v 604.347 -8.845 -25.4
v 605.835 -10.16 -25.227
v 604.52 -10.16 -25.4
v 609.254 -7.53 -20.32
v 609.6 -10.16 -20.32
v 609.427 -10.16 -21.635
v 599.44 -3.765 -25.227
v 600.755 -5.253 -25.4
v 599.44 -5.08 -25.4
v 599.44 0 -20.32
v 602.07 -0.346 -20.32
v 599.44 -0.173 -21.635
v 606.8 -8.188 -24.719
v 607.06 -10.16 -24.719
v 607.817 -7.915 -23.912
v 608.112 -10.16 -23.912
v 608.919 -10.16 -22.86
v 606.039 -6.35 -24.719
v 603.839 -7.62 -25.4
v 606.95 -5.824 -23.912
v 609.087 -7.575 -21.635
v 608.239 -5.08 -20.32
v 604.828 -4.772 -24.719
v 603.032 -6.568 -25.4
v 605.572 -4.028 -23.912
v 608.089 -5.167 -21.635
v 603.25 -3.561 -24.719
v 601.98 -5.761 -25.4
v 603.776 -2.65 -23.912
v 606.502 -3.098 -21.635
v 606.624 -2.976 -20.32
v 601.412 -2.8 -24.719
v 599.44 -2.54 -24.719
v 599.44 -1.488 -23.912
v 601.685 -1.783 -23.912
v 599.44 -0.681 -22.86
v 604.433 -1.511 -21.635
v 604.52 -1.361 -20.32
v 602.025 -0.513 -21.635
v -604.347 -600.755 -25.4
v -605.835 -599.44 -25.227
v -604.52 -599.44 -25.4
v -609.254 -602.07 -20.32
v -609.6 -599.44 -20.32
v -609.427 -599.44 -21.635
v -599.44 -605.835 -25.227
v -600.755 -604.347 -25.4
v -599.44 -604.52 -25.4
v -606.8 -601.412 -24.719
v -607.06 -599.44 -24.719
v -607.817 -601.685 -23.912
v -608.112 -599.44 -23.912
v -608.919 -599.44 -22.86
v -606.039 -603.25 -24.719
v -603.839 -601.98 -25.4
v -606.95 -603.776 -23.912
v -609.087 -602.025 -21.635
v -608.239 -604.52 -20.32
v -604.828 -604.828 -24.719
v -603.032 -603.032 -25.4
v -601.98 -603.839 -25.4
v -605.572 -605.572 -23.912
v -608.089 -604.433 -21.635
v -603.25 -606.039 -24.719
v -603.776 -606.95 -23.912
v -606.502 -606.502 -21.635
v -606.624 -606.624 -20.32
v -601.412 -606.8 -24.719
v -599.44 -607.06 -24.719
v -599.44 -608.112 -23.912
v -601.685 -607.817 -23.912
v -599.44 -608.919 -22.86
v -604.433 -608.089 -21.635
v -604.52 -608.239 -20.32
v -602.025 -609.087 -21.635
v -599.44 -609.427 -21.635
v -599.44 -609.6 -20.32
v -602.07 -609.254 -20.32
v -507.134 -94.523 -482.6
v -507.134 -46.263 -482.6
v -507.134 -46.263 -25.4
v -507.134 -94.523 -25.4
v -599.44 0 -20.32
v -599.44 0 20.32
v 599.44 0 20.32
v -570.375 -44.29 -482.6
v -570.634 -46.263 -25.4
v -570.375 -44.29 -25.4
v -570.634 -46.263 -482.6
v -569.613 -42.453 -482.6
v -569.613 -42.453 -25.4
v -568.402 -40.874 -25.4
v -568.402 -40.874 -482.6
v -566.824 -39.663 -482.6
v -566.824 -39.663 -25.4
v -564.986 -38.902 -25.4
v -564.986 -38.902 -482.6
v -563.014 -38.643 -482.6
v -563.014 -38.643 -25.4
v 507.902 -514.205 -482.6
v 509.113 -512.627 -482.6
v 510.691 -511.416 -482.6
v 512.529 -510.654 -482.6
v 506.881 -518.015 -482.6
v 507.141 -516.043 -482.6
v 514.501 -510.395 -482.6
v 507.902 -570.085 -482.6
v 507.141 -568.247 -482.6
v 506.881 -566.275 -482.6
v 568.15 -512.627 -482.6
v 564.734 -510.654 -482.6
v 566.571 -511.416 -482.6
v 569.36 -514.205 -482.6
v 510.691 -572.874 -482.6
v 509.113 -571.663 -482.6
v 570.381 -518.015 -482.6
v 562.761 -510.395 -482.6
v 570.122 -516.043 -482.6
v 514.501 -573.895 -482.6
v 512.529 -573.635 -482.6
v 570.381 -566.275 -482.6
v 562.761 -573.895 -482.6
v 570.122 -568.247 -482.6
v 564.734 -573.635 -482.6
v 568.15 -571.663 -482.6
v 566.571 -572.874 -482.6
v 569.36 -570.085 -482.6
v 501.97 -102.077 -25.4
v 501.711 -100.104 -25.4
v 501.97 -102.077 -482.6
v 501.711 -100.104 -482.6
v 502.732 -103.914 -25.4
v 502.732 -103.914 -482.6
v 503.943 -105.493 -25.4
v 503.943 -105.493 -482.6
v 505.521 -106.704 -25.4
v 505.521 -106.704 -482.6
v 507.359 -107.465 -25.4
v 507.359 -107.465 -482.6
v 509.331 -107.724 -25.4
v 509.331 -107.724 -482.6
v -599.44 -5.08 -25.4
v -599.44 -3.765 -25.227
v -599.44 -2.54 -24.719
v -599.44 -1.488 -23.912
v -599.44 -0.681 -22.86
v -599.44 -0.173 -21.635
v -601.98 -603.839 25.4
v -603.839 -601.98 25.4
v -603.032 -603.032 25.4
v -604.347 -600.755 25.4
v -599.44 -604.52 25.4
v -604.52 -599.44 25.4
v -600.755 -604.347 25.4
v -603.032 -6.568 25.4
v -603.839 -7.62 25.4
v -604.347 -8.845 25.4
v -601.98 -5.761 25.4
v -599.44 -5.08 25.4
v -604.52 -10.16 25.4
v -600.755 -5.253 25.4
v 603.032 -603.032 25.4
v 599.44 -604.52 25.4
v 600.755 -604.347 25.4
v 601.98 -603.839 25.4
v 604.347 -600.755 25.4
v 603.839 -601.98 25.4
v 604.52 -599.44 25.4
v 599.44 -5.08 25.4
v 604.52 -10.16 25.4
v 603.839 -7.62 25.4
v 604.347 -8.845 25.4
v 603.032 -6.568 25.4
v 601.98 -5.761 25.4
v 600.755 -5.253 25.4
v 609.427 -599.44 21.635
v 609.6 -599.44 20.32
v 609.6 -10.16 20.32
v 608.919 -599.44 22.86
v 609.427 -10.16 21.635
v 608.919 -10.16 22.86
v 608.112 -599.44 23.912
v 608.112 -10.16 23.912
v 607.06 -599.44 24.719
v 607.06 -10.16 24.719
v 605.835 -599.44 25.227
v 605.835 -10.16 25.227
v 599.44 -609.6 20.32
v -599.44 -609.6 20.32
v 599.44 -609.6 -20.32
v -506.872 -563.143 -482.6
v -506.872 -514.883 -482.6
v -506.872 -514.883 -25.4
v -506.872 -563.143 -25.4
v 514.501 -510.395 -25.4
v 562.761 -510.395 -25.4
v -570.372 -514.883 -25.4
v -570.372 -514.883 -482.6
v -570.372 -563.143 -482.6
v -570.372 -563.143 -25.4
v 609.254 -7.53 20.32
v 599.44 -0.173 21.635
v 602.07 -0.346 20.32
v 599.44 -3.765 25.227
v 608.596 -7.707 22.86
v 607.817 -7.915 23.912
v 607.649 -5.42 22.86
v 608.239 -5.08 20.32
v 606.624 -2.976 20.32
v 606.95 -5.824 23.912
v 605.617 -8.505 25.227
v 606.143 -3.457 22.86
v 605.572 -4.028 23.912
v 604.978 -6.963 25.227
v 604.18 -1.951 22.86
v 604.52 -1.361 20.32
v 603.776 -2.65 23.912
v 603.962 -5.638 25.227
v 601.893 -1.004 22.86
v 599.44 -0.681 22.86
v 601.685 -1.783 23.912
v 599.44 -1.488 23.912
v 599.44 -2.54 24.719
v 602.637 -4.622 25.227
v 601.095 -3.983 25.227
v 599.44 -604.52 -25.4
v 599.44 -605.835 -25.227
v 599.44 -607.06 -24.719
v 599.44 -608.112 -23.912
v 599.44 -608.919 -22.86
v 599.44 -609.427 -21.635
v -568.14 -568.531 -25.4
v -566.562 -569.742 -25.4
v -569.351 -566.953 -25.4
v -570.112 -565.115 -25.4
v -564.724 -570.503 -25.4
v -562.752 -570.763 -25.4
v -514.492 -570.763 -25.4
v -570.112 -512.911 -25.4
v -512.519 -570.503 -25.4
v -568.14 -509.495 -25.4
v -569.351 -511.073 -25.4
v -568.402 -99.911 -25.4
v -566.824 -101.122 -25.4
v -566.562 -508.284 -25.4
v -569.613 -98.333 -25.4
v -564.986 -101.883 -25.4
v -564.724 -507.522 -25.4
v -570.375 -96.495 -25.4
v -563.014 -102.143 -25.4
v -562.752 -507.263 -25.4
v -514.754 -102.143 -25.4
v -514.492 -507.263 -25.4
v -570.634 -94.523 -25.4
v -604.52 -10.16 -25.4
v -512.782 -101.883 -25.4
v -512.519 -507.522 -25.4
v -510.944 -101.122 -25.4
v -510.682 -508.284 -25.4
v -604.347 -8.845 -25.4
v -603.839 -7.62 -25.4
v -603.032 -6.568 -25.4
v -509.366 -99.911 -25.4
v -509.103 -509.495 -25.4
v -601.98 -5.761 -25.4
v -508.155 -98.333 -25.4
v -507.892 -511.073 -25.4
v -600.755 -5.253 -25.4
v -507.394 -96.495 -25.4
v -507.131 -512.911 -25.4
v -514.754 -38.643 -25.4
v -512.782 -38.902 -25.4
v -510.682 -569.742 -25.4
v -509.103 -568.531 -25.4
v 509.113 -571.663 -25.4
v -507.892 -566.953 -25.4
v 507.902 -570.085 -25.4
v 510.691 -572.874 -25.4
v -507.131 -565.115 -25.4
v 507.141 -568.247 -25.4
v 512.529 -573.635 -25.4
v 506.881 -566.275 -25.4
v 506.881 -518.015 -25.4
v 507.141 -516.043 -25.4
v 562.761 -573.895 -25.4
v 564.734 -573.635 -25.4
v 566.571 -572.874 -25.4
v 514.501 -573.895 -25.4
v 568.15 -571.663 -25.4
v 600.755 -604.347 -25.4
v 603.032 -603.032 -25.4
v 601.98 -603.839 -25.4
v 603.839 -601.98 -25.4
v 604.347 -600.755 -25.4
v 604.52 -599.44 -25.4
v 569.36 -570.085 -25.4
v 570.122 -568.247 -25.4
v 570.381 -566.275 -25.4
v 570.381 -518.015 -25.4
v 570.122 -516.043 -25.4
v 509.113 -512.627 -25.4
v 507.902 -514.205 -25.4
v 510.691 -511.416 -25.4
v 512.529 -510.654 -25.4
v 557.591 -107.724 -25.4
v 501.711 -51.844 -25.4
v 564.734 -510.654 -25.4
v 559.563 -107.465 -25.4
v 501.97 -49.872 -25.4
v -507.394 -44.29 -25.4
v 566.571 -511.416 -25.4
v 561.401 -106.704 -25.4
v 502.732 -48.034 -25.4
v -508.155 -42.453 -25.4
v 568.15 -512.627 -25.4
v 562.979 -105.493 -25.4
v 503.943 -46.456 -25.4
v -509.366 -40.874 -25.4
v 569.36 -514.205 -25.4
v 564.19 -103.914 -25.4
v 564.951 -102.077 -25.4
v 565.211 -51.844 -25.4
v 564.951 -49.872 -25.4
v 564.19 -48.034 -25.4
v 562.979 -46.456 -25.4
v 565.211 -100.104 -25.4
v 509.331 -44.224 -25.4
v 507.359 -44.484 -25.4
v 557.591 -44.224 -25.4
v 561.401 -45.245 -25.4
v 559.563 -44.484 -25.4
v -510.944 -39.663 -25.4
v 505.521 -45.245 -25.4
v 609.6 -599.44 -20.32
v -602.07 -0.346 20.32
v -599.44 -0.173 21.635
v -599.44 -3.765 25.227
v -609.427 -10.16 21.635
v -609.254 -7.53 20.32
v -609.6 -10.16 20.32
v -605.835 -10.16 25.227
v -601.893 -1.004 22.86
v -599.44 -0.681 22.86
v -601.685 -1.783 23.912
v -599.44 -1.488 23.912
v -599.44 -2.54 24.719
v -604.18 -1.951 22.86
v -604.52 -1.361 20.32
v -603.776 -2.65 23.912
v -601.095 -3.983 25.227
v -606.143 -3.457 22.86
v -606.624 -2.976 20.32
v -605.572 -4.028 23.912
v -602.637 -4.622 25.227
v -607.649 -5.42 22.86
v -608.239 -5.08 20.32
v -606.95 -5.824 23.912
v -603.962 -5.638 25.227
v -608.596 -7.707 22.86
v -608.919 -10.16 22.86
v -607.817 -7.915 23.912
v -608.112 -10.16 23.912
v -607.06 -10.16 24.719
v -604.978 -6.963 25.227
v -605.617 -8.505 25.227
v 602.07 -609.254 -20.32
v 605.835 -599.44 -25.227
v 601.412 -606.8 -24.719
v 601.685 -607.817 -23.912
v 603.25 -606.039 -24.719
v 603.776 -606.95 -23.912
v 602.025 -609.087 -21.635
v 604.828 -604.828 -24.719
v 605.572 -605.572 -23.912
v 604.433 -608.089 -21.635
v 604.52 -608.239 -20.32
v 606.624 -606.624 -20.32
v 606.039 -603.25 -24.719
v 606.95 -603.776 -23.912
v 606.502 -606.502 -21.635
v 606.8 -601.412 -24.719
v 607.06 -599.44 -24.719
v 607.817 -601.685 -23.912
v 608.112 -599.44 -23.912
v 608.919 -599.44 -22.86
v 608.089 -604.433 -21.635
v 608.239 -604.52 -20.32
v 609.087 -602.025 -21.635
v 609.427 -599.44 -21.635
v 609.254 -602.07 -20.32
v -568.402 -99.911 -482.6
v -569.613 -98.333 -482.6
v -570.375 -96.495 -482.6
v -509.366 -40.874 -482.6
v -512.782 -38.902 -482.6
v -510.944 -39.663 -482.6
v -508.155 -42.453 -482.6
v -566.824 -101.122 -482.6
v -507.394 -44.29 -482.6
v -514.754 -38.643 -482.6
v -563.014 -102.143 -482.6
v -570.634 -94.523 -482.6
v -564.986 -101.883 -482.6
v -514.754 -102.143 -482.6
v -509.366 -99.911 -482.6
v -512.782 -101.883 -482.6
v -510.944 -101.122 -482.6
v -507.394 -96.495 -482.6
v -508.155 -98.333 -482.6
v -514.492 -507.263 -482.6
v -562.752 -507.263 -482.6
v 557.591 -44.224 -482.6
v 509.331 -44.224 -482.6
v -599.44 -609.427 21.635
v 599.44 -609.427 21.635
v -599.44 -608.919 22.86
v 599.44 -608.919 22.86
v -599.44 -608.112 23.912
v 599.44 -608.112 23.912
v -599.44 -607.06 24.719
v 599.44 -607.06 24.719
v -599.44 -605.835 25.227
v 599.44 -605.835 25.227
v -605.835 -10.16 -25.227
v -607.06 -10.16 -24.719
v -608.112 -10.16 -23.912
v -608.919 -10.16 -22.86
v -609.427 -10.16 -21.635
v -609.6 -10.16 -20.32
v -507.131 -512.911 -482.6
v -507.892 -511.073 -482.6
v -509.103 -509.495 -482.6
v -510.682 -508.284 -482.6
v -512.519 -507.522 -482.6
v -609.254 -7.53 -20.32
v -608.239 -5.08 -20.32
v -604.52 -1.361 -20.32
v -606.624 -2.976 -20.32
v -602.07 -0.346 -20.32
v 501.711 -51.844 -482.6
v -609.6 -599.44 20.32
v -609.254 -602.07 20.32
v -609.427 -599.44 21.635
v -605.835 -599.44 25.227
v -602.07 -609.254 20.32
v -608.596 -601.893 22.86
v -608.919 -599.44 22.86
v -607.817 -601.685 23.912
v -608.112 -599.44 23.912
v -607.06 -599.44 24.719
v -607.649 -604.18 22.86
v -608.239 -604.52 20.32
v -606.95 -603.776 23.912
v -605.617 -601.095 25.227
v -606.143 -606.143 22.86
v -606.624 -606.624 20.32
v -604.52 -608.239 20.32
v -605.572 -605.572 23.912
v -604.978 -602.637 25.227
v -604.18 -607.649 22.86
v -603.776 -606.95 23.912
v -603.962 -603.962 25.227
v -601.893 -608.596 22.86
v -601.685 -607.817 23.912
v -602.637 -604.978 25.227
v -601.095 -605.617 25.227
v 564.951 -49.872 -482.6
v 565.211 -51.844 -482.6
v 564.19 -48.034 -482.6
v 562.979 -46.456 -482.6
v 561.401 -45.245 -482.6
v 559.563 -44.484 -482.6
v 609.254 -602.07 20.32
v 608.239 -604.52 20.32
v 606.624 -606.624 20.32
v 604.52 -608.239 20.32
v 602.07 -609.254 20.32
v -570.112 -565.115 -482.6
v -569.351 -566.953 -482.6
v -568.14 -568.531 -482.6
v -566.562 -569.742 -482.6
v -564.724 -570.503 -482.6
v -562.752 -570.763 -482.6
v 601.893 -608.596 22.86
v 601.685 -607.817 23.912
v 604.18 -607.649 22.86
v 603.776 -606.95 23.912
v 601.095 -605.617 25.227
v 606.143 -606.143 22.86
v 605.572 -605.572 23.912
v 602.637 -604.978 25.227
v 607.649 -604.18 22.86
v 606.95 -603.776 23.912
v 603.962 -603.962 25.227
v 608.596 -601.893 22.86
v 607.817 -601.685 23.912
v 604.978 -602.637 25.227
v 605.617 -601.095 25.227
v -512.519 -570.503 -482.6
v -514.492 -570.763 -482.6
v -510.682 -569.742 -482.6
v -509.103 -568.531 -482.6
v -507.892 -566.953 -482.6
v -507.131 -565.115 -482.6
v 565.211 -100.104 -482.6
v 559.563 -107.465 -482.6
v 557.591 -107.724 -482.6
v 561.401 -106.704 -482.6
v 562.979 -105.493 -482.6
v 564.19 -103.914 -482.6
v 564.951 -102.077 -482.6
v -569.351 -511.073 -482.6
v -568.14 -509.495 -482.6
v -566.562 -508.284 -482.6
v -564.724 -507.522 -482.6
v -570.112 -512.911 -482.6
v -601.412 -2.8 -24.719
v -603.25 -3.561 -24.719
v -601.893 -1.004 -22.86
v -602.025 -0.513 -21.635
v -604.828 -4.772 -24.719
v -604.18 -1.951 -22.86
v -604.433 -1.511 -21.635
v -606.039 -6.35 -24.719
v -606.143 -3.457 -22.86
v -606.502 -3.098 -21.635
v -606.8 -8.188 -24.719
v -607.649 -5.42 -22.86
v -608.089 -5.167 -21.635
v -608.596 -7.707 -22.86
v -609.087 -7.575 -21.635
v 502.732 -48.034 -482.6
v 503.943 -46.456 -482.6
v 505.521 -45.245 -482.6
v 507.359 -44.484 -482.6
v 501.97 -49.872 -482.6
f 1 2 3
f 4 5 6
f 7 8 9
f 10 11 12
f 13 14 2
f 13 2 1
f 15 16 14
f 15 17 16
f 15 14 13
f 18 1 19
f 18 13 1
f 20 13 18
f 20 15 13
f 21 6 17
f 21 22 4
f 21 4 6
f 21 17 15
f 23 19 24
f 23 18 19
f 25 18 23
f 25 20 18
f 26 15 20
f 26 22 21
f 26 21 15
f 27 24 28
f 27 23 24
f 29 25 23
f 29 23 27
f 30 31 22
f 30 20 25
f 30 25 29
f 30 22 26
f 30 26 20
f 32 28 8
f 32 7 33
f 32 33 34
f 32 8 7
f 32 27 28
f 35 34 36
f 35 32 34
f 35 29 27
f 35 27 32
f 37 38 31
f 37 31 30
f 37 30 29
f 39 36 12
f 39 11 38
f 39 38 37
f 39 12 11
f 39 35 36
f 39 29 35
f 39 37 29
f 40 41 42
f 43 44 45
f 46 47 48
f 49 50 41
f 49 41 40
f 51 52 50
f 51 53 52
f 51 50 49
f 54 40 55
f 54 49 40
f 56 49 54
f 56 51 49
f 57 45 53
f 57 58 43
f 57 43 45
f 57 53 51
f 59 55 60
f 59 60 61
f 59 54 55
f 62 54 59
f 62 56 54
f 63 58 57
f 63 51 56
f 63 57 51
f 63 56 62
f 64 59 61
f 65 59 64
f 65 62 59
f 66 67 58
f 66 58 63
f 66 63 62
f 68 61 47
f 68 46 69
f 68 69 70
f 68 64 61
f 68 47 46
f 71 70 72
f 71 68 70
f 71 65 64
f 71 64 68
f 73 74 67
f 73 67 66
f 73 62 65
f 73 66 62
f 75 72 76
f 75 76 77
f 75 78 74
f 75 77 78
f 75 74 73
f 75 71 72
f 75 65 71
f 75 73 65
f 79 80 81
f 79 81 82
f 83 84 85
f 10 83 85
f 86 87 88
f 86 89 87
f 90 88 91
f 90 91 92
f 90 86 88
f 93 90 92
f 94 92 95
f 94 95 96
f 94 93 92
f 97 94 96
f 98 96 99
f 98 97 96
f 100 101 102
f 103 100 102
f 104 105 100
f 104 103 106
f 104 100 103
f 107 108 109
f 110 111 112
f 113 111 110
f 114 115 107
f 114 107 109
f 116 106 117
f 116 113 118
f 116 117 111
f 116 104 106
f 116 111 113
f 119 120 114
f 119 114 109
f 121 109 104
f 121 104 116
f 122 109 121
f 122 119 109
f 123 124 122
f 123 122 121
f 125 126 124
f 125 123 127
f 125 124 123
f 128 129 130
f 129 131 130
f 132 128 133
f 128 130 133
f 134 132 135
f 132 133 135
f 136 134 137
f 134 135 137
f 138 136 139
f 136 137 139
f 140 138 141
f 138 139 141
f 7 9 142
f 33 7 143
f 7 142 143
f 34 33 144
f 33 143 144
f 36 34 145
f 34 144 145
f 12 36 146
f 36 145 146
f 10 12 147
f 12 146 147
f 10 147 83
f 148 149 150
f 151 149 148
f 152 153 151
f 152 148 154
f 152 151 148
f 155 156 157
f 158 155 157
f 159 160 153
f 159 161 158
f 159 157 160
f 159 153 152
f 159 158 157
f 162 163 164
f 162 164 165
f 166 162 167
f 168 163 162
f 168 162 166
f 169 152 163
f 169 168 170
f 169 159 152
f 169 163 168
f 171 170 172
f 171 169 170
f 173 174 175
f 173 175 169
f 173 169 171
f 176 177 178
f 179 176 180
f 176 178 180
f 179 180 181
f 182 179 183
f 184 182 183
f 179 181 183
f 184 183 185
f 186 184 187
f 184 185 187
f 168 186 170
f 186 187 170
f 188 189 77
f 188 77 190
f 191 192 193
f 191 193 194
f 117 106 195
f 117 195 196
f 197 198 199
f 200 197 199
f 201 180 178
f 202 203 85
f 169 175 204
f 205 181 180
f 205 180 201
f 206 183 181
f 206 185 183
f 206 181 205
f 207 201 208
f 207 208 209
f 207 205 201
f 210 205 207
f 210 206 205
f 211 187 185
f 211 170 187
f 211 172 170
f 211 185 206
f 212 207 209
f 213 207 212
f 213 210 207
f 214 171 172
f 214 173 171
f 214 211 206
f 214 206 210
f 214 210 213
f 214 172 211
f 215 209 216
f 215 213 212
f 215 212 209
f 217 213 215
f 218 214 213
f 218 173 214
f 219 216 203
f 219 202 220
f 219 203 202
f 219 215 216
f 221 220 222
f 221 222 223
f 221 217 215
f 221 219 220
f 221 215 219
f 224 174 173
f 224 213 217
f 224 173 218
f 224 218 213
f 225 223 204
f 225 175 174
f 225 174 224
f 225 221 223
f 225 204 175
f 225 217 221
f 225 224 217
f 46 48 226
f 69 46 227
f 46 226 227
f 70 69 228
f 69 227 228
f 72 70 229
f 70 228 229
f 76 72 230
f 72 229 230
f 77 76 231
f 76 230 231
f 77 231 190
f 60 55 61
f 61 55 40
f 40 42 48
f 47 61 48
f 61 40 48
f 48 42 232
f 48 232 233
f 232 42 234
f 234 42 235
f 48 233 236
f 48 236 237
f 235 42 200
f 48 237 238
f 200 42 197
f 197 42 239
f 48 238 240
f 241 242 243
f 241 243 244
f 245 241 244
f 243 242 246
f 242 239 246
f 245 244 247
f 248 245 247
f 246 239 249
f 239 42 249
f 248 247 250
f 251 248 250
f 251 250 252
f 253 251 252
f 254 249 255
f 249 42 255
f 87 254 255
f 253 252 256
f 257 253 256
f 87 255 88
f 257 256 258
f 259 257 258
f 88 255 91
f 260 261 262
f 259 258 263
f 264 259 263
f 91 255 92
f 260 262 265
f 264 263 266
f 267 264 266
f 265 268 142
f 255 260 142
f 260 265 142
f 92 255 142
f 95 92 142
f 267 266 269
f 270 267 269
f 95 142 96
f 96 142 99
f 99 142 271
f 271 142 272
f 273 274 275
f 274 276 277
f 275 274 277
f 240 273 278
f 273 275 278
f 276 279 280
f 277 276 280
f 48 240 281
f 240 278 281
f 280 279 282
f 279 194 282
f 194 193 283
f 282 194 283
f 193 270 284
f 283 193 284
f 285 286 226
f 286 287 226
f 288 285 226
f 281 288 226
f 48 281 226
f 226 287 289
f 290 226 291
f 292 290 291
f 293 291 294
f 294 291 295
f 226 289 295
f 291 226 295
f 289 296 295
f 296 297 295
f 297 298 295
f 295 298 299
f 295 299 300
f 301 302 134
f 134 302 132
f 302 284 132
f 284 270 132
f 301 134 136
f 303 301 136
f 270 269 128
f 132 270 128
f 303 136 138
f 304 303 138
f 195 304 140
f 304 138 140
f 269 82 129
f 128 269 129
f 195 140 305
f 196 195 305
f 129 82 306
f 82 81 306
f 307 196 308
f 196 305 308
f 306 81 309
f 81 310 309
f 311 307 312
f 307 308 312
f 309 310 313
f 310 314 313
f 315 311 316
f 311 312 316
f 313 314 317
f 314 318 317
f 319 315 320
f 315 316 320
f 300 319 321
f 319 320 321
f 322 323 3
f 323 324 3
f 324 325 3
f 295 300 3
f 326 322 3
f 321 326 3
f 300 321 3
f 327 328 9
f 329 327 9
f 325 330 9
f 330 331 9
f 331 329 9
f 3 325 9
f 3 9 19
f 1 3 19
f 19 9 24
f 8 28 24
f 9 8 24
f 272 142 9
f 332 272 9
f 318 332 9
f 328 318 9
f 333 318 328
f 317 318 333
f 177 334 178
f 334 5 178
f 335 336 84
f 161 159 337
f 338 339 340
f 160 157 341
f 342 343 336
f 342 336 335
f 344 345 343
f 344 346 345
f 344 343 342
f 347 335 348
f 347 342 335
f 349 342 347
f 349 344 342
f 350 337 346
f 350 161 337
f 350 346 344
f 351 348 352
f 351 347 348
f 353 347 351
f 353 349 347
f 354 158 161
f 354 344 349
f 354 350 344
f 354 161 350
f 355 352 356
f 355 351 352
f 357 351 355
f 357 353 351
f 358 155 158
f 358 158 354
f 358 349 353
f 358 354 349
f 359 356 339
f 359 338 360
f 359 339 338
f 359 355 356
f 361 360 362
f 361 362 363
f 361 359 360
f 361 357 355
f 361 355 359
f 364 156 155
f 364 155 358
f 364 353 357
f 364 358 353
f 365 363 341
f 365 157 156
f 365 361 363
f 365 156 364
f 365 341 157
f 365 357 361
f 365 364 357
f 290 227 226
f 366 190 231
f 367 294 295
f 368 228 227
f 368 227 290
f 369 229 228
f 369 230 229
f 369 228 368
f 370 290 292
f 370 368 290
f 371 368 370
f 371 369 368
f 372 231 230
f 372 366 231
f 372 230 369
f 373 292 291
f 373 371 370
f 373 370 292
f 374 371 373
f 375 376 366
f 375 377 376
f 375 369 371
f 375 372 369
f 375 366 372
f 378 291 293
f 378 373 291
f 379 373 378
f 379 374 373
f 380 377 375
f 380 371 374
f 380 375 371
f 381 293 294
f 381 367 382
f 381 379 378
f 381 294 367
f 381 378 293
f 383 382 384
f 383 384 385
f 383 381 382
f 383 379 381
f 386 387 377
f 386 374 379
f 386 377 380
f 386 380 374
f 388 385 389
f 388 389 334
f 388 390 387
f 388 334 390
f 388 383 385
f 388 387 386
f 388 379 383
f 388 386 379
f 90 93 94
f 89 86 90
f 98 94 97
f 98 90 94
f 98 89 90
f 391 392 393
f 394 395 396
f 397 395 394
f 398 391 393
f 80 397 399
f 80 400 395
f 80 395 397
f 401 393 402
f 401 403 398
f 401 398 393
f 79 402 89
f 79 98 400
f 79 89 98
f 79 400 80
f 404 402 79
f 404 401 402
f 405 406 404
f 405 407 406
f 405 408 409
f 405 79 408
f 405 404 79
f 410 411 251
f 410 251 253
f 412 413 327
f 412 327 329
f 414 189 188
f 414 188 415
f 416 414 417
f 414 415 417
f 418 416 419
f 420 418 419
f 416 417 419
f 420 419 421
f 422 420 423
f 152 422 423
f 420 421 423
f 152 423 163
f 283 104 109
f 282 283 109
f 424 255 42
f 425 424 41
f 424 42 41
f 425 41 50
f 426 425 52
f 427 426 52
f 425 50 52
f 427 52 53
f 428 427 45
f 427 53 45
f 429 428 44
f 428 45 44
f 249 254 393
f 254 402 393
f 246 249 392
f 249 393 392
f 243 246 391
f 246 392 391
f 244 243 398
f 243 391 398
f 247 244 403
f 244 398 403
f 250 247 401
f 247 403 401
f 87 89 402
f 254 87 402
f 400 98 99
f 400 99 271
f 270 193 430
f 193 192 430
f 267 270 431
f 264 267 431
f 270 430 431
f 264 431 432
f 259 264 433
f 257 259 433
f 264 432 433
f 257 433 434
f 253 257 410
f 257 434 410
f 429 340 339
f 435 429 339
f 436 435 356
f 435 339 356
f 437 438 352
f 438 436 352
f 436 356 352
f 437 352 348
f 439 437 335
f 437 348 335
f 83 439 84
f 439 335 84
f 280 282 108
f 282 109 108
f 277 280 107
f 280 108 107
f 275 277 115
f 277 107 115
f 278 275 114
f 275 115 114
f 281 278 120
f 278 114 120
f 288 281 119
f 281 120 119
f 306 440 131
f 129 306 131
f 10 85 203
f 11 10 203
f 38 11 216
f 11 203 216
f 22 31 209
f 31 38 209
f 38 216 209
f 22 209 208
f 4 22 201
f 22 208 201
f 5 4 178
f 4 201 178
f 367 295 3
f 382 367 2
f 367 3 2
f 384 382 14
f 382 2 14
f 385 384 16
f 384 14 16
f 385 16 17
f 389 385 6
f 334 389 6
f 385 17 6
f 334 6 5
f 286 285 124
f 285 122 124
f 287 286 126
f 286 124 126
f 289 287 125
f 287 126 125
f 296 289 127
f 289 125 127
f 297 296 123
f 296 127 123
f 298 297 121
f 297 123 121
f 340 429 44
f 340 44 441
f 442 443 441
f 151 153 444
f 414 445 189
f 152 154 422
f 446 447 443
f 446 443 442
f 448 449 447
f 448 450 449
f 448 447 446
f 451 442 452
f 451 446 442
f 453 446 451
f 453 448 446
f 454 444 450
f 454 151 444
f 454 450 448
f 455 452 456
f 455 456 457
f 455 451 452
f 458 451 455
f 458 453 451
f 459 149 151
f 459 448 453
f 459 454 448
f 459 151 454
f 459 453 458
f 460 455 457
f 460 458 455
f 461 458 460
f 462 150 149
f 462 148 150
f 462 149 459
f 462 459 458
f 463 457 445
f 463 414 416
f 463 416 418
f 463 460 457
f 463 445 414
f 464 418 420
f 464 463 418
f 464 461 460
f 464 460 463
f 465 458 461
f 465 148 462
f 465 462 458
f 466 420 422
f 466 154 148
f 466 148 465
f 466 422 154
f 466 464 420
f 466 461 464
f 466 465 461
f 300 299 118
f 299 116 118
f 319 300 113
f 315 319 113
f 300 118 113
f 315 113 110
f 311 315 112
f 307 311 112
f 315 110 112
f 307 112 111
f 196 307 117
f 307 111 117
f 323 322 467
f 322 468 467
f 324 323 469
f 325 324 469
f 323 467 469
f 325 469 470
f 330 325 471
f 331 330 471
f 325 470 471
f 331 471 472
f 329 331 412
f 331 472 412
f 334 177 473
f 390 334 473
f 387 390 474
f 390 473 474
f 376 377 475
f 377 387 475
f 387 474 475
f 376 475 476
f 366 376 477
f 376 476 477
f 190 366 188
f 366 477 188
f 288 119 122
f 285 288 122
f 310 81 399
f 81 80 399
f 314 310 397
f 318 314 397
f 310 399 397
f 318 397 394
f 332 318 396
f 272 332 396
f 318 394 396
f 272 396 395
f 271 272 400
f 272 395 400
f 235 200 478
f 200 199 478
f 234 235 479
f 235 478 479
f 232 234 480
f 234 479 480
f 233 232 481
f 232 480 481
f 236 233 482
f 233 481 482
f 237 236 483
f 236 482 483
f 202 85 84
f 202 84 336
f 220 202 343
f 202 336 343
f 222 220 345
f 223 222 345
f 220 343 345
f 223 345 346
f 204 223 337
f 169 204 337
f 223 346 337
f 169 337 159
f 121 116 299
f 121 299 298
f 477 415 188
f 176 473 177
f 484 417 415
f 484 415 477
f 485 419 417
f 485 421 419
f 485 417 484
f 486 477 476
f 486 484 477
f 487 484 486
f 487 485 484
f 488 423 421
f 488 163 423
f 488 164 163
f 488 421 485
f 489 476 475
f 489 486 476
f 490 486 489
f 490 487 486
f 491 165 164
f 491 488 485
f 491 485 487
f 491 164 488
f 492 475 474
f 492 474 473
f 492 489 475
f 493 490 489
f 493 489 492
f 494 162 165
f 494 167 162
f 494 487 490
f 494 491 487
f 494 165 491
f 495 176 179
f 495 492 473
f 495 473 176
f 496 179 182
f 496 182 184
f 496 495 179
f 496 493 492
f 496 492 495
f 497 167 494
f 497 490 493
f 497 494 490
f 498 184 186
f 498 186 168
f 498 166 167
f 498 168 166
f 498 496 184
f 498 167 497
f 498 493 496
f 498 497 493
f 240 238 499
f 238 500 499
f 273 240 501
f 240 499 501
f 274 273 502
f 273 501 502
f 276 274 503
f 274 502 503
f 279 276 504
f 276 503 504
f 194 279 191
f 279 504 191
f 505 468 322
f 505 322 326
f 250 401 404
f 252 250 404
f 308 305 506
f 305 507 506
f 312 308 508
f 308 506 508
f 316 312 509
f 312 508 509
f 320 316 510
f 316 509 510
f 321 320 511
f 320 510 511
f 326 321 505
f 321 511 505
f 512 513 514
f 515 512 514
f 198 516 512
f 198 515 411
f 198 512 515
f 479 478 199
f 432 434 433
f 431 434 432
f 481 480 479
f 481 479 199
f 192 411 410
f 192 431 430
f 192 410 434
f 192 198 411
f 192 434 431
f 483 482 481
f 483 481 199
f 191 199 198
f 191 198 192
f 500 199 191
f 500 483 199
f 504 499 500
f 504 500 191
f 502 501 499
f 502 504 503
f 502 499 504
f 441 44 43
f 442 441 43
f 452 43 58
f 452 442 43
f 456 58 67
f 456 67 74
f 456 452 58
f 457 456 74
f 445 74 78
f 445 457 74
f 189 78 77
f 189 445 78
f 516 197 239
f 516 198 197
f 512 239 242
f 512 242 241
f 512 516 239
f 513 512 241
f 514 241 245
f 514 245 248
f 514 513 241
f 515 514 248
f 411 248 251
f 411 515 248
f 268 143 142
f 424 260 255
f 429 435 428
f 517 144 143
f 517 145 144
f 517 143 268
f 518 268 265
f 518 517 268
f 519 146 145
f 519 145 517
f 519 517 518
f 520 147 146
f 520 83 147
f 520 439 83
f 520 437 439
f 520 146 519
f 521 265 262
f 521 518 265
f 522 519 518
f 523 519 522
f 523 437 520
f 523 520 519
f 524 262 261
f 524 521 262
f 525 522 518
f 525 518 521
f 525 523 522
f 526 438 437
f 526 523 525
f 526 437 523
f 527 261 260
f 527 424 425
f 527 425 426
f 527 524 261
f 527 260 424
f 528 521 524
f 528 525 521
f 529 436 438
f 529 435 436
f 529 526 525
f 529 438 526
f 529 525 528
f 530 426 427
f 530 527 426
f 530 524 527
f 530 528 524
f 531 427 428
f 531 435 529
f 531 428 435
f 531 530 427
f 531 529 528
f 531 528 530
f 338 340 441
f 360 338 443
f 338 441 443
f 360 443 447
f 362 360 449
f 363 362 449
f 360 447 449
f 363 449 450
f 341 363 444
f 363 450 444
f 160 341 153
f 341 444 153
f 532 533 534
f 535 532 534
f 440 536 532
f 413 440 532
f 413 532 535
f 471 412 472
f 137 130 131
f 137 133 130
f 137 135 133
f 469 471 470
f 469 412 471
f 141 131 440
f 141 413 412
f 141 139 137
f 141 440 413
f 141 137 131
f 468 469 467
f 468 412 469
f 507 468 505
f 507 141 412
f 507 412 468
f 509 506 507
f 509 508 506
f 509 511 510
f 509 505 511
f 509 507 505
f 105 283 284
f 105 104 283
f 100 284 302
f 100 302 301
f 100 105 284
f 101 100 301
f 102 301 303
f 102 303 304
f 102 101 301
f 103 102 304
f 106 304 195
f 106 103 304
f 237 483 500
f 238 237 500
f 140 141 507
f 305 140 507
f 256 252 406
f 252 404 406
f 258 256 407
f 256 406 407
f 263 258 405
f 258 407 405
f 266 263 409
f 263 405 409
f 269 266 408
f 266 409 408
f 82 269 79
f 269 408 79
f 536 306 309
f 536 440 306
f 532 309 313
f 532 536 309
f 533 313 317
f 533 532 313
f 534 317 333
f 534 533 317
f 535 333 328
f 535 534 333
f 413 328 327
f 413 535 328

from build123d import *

# Parameters (mm, degrees)
F0_W      = 1219.2
F0_H      = 50.8
F1_DEPTH  = 609.6
F3_R      = 10.16
F4_R      = 10.16
F5_R      = 10.16
F6_R      = 10.16
F7_R      = 5.08
F8_W      = 63.5
F8_H      = 63.5
F9_DEPTH  = 457.2
F10_R     = 7.62
F11_W     = 63.5
F11_H     = 63.5
F12_DEPTH = 457.2
F13_R     = 7.62
F14_W     = 63.5
F14_H     = 63.5
F15_DEPTH = 457.2
F16_R     = 7.62
F17_W     = 63.5
F17_H     = 63.5
F18_DEPTH = 457.2
F19_R     = 7.62


with BuildPart() as f1:
    # F0 (on Front) → F1 (new body)
    with BuildSketch(Plane.XZ):
        Rectangle(F0_W, F0_H)
    extrude(amount=F1_DEPTH)

    # F3
    f3_edges = [f1.edges().sort_by_distance(p)[0] for p in [
        (-609.6, -609.6, 0),
    ]]
    fillet(f3_edges, radius=F3_R)

    # F4
    f4_edges = [f1.edges().sort_by_distance(p)[0] for p in [
        (-609.6, 0, 0),
    ]]
    fillet(f4_edges, radius=F4_R)

    # F5
    f5_edges = [f1.edges().sort_by_distance(p)[0] for p in [
        (609.6, 0, 0),
    ]]
    fillet(f5_edges, radius=F5_R)

    # F6
    f6_edges = [f1.edges().sort_by_distance(p)[0] for p in [
        (609.6, -609.6, 0),
    ]]
    fillet(f6_edges, radius=F6_R)

    # F7
    f7_edges = [f1.edges().sort_by_distance(p)[0] for p in [
        (-609.6, -304.8, 25.4),
        (-609.6, -304.8, -25.4),
    ]]
    fillet(f7_edges, radius=F7_R)

    # F8 (on face) → F9 (join)
    with BuildSketch(Plane(origin=(0, 0, -25.4), x_dir=(1, 0, 0), z_dir=(0, 0, -1))):
        with Locations((-538.884262, 70.392589)):
            Rectangle(F8_W, F8_H)
    extrude(amount=F9_DEPTH)

    # F10
    f10_edges = [f1.edges().sort_by_distance(p)[0] for p in [
        (-507.134262, -38.642589, -254),
        (-507.134262, -102.142589, -254),
        (-570.634262, -102.142589, -254),
        (-570.634262, -38.642589, -254),
    ]]
    fillet(f10_edges, radius=F10_R)

    # F11 (on face) → F12 (join)
    with BuildSketch(Plane(origin=(0, 0, -25.4), x_dir=(1, 0, 0), z_dir=(0, 0, -1))):
        with Locations((533.460811, 75.974436)):
            Rectangle(F11_W, F11_H)
    extrude(amount=F12_DEPTH)

    # F13
    f13_edges = [f1.edges().sort_by_distance(p)[0] for p in [
        (565.210811, -107.724436, -254),
        (565.210811, -44.224436, -254),
        (501.710811, -107.724436, -254),
        (501.710811, -44.224436, -254),
    ]]
    fillet(f13_edges, radius=F13_R)

    # F14 (on face) → F15 (join)
    with BuildSketch(Plane(origin=(0, 0, -25.4), x_dir=(1, 0, 0), z_dir=(0, 0, -1))):
        with Locations((-538.621542, 539.01282)):
            Rectangle(F14_W, F14_H)
    extrude(amount=F15_DEPTH)

    # F16
    f16_edges = [f1.edges().sort_by_distance(p)[0] for p in [
        (-570.371542, -570.76282, -254),
        (-506.871542, -570.76282, -254),
        (-506.871542, -507.26282, -254),
        (-570.371542, -507.26282, -254),
    ]]
    fillet(f16_edges, radius=F16_R)

    # F17 (on face) → F18 (join)
    with BuildSketch(Plane(origin=(0, 0, -25.4), x_dir=(1, 0, 0), z_dir=(0, 0, -1))):
        with Locations((538.63135, 542.144825)):
            Rectangle(F17_W, F17_H)
    extrude(amount=F18_DEPTH)

    # F19
    f19_edges = [f1.edges().sort_by_distance(p)[0] for p in [
        (570.38135, -573.894825, -254),
        (506.88135, -573.894825, -254),
        (506.88135, -510.394825, -254),
        (570.38135, -510.394825, -254),
    ]]
    fillet(f19_edges, radius=F19_R)


solid = f1.part
